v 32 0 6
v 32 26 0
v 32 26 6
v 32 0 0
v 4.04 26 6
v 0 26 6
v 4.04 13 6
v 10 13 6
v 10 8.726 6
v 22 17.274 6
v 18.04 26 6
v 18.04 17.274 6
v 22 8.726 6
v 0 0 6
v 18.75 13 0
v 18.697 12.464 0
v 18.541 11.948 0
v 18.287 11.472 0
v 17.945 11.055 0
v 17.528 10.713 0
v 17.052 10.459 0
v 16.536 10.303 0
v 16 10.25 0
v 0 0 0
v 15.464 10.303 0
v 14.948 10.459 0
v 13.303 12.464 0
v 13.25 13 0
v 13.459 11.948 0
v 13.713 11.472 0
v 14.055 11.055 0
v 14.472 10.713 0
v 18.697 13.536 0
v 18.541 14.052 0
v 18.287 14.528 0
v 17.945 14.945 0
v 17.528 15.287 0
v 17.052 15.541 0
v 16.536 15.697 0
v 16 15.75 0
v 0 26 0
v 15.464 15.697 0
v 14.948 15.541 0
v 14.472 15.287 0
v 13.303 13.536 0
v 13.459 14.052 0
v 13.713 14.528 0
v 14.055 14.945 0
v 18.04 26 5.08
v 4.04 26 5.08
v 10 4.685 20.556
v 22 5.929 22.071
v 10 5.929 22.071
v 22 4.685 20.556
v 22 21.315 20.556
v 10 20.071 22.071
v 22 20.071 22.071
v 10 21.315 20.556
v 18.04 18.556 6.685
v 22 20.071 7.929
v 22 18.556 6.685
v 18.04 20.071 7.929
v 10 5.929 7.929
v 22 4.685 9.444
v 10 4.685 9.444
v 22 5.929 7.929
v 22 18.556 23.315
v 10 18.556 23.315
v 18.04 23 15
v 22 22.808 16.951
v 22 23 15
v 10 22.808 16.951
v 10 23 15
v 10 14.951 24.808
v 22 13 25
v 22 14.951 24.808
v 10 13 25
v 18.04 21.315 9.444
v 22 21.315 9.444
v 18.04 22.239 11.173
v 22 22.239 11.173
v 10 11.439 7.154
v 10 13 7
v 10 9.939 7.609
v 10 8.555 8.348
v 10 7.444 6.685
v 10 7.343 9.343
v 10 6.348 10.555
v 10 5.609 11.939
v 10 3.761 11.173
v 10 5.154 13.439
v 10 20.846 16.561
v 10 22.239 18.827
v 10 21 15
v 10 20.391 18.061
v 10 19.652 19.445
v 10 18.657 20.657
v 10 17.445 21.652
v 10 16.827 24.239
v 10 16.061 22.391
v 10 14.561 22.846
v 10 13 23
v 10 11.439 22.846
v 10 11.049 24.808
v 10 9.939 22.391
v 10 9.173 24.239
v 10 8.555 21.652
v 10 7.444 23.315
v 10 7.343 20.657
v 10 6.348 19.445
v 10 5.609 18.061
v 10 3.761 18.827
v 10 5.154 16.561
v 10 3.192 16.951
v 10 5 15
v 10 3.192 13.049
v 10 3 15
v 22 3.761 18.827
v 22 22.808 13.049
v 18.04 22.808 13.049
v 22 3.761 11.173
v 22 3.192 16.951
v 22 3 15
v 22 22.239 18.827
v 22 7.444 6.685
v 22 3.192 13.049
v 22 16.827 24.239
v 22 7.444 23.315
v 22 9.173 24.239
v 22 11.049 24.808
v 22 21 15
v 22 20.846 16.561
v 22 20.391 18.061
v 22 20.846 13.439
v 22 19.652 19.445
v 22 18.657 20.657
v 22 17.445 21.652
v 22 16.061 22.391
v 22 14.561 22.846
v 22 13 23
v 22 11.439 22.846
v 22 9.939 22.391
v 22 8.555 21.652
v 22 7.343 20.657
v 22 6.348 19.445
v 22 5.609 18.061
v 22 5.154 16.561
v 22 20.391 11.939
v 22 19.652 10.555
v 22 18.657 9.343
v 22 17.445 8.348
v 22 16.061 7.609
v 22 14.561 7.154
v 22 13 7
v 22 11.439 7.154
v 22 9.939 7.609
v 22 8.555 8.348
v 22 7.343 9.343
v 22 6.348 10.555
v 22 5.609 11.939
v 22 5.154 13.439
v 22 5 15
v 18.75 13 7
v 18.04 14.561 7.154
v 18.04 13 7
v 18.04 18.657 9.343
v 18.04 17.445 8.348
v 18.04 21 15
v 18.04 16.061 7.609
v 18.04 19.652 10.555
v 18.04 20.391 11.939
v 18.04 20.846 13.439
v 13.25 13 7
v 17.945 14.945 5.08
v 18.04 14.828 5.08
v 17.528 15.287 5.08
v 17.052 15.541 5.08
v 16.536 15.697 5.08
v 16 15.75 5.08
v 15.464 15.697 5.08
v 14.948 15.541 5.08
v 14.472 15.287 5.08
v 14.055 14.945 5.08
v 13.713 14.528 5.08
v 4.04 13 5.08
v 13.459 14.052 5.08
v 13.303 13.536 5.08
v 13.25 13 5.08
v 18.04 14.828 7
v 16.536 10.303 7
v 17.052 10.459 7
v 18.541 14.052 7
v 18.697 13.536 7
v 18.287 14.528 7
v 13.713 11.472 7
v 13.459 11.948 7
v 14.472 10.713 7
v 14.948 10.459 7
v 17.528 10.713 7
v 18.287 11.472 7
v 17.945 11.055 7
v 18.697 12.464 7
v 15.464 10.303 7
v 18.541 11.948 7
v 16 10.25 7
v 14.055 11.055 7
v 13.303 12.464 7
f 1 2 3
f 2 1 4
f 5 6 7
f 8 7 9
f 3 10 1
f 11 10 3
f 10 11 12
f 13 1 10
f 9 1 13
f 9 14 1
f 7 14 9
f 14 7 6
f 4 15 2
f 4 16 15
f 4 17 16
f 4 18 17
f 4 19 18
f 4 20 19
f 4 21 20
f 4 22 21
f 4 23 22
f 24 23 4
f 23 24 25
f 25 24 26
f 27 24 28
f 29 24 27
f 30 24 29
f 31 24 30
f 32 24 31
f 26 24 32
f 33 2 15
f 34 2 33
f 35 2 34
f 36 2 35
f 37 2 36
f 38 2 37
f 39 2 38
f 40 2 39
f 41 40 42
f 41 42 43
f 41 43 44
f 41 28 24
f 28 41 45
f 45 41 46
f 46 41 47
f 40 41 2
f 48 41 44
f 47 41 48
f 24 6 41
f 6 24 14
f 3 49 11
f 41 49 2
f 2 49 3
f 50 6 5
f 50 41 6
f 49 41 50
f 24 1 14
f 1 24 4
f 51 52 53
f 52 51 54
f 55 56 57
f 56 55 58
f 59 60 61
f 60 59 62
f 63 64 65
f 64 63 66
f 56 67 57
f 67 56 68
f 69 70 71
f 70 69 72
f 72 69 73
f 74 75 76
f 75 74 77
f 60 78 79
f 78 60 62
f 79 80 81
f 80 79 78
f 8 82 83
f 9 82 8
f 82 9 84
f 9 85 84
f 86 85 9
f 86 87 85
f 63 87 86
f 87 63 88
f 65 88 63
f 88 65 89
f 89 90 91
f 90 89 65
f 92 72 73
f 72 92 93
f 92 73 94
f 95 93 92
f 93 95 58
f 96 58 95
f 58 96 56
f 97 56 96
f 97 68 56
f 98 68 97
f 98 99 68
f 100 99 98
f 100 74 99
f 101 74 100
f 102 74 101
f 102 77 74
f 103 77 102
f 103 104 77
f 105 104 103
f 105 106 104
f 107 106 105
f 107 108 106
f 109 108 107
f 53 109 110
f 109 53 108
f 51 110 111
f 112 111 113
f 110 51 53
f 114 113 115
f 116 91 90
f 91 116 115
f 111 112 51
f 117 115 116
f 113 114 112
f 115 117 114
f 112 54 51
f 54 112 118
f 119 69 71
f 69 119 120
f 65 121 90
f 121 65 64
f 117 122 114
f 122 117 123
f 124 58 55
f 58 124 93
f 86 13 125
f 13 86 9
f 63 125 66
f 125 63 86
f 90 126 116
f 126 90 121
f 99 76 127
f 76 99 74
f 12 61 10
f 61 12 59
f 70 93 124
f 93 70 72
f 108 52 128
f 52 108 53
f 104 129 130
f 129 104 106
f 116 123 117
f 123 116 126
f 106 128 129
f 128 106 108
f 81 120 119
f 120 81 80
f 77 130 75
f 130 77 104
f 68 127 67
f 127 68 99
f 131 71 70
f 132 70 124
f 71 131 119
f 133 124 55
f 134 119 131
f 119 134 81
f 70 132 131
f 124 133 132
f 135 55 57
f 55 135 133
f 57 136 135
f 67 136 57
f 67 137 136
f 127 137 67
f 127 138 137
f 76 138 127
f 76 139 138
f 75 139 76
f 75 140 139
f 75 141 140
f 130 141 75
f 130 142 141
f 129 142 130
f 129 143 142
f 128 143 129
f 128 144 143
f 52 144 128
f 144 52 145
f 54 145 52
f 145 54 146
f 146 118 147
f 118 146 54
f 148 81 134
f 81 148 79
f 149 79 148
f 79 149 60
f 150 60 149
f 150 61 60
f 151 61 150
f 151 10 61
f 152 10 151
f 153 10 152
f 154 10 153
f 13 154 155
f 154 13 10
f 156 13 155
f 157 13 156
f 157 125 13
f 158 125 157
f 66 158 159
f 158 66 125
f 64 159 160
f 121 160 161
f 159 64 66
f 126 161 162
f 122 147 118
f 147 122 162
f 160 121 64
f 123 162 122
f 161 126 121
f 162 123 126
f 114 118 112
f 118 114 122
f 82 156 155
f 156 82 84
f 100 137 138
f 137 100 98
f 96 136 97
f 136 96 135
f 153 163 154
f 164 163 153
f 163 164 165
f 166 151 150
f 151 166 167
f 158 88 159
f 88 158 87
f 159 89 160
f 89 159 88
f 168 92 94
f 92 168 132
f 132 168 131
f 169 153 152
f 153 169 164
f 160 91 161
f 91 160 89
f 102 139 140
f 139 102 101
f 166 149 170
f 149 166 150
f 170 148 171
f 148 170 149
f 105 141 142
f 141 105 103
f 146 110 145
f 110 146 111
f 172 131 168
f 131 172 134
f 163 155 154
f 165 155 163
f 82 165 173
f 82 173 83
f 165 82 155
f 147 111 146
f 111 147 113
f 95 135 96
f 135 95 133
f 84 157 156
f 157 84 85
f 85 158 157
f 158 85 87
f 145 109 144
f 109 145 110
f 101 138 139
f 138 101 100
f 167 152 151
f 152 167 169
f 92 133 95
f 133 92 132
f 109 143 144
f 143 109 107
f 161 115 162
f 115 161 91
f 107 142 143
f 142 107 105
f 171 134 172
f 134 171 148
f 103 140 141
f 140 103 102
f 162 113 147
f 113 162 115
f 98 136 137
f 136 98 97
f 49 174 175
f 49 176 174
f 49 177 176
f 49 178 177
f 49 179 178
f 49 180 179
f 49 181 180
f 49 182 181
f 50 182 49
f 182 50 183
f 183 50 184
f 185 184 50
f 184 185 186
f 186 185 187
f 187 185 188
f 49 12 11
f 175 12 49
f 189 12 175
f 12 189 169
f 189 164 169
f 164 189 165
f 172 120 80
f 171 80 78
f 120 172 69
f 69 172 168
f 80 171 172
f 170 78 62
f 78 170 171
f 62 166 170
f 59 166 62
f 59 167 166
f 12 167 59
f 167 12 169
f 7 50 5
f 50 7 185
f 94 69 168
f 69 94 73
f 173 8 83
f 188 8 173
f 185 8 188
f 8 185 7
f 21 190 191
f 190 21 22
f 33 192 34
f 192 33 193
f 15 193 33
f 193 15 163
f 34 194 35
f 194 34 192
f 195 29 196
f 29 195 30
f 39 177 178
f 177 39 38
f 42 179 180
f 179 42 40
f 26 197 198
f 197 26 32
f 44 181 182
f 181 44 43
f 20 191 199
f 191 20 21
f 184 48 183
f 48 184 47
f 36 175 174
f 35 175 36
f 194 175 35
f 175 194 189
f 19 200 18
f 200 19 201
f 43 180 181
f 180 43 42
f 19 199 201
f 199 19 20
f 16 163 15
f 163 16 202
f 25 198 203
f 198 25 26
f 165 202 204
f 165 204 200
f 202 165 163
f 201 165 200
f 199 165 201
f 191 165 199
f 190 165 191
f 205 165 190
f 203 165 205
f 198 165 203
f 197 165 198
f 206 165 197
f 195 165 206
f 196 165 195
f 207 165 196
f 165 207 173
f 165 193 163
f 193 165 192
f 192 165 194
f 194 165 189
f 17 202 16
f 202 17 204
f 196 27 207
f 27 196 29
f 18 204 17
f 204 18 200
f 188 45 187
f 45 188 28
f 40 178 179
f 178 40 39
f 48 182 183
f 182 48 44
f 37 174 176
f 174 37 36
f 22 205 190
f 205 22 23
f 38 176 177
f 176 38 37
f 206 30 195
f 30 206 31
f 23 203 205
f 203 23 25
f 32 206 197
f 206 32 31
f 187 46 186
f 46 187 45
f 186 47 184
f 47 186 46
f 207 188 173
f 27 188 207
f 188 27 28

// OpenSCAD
$fn = 32;

// ----------------------------------------------------------------------
// Cable clip: cable 16 mm, clamp 20 mm, base 32 mm
// ----------------------------------------------------------------------

// --- parameters (mm) ---
plate_x = 32;             // base length, X
plate_y = 26;             // base width, Y
plate_t = 6;              // base thickness
wire_seat_d = 20;         // clamp outside diameter
clip_t = 2;               // clamp wall
cable_d = 16;             // cable opening
ring_w = 12;              // clamp width along the cable
screw_d = 5.5;            // screw clearance
throat = 9.92;            // snap throat width
sink = 1;                 // overlap of the clamp into the base

module base() {
  cube([plate_x, plate_y, plate_t]);
}

module clamp() {
  translate([plate_x / 2, plate_y / 2, plate_t + wire_seat_d / 2 - sink]) rotate([0, 90, 0])
    cylinder(h = ring_w, d = wire_seat_d, center = true);
}

difference() {
  union() {
    base();
    clamp();
  }
  translate([plate_x / 2, plate_y / 2, plate_t + wire_seat_d / 2 - sink]) rotate([0, 90, 0]) translate([0, 0, -ring_w / 2 - 1]) cylinder(h = ring_w + 2, d = cable_d);
  /* snap throat: the opening is narrower than the cable */
  translate([plate_x / 2 - throat / 2, plate_y / 2, plate_t + wire_seat_d / 2 - sink]) rotate([0, 90, 0]) translate([0, 0, -ring_w / 2 - 1]) cube([throat, wire_seat_d + 2, ring_w + 2]);
  translate([16, plate_y / 2, -1]) cylinder(h = plate_t + 2, d = screw_d);
}
